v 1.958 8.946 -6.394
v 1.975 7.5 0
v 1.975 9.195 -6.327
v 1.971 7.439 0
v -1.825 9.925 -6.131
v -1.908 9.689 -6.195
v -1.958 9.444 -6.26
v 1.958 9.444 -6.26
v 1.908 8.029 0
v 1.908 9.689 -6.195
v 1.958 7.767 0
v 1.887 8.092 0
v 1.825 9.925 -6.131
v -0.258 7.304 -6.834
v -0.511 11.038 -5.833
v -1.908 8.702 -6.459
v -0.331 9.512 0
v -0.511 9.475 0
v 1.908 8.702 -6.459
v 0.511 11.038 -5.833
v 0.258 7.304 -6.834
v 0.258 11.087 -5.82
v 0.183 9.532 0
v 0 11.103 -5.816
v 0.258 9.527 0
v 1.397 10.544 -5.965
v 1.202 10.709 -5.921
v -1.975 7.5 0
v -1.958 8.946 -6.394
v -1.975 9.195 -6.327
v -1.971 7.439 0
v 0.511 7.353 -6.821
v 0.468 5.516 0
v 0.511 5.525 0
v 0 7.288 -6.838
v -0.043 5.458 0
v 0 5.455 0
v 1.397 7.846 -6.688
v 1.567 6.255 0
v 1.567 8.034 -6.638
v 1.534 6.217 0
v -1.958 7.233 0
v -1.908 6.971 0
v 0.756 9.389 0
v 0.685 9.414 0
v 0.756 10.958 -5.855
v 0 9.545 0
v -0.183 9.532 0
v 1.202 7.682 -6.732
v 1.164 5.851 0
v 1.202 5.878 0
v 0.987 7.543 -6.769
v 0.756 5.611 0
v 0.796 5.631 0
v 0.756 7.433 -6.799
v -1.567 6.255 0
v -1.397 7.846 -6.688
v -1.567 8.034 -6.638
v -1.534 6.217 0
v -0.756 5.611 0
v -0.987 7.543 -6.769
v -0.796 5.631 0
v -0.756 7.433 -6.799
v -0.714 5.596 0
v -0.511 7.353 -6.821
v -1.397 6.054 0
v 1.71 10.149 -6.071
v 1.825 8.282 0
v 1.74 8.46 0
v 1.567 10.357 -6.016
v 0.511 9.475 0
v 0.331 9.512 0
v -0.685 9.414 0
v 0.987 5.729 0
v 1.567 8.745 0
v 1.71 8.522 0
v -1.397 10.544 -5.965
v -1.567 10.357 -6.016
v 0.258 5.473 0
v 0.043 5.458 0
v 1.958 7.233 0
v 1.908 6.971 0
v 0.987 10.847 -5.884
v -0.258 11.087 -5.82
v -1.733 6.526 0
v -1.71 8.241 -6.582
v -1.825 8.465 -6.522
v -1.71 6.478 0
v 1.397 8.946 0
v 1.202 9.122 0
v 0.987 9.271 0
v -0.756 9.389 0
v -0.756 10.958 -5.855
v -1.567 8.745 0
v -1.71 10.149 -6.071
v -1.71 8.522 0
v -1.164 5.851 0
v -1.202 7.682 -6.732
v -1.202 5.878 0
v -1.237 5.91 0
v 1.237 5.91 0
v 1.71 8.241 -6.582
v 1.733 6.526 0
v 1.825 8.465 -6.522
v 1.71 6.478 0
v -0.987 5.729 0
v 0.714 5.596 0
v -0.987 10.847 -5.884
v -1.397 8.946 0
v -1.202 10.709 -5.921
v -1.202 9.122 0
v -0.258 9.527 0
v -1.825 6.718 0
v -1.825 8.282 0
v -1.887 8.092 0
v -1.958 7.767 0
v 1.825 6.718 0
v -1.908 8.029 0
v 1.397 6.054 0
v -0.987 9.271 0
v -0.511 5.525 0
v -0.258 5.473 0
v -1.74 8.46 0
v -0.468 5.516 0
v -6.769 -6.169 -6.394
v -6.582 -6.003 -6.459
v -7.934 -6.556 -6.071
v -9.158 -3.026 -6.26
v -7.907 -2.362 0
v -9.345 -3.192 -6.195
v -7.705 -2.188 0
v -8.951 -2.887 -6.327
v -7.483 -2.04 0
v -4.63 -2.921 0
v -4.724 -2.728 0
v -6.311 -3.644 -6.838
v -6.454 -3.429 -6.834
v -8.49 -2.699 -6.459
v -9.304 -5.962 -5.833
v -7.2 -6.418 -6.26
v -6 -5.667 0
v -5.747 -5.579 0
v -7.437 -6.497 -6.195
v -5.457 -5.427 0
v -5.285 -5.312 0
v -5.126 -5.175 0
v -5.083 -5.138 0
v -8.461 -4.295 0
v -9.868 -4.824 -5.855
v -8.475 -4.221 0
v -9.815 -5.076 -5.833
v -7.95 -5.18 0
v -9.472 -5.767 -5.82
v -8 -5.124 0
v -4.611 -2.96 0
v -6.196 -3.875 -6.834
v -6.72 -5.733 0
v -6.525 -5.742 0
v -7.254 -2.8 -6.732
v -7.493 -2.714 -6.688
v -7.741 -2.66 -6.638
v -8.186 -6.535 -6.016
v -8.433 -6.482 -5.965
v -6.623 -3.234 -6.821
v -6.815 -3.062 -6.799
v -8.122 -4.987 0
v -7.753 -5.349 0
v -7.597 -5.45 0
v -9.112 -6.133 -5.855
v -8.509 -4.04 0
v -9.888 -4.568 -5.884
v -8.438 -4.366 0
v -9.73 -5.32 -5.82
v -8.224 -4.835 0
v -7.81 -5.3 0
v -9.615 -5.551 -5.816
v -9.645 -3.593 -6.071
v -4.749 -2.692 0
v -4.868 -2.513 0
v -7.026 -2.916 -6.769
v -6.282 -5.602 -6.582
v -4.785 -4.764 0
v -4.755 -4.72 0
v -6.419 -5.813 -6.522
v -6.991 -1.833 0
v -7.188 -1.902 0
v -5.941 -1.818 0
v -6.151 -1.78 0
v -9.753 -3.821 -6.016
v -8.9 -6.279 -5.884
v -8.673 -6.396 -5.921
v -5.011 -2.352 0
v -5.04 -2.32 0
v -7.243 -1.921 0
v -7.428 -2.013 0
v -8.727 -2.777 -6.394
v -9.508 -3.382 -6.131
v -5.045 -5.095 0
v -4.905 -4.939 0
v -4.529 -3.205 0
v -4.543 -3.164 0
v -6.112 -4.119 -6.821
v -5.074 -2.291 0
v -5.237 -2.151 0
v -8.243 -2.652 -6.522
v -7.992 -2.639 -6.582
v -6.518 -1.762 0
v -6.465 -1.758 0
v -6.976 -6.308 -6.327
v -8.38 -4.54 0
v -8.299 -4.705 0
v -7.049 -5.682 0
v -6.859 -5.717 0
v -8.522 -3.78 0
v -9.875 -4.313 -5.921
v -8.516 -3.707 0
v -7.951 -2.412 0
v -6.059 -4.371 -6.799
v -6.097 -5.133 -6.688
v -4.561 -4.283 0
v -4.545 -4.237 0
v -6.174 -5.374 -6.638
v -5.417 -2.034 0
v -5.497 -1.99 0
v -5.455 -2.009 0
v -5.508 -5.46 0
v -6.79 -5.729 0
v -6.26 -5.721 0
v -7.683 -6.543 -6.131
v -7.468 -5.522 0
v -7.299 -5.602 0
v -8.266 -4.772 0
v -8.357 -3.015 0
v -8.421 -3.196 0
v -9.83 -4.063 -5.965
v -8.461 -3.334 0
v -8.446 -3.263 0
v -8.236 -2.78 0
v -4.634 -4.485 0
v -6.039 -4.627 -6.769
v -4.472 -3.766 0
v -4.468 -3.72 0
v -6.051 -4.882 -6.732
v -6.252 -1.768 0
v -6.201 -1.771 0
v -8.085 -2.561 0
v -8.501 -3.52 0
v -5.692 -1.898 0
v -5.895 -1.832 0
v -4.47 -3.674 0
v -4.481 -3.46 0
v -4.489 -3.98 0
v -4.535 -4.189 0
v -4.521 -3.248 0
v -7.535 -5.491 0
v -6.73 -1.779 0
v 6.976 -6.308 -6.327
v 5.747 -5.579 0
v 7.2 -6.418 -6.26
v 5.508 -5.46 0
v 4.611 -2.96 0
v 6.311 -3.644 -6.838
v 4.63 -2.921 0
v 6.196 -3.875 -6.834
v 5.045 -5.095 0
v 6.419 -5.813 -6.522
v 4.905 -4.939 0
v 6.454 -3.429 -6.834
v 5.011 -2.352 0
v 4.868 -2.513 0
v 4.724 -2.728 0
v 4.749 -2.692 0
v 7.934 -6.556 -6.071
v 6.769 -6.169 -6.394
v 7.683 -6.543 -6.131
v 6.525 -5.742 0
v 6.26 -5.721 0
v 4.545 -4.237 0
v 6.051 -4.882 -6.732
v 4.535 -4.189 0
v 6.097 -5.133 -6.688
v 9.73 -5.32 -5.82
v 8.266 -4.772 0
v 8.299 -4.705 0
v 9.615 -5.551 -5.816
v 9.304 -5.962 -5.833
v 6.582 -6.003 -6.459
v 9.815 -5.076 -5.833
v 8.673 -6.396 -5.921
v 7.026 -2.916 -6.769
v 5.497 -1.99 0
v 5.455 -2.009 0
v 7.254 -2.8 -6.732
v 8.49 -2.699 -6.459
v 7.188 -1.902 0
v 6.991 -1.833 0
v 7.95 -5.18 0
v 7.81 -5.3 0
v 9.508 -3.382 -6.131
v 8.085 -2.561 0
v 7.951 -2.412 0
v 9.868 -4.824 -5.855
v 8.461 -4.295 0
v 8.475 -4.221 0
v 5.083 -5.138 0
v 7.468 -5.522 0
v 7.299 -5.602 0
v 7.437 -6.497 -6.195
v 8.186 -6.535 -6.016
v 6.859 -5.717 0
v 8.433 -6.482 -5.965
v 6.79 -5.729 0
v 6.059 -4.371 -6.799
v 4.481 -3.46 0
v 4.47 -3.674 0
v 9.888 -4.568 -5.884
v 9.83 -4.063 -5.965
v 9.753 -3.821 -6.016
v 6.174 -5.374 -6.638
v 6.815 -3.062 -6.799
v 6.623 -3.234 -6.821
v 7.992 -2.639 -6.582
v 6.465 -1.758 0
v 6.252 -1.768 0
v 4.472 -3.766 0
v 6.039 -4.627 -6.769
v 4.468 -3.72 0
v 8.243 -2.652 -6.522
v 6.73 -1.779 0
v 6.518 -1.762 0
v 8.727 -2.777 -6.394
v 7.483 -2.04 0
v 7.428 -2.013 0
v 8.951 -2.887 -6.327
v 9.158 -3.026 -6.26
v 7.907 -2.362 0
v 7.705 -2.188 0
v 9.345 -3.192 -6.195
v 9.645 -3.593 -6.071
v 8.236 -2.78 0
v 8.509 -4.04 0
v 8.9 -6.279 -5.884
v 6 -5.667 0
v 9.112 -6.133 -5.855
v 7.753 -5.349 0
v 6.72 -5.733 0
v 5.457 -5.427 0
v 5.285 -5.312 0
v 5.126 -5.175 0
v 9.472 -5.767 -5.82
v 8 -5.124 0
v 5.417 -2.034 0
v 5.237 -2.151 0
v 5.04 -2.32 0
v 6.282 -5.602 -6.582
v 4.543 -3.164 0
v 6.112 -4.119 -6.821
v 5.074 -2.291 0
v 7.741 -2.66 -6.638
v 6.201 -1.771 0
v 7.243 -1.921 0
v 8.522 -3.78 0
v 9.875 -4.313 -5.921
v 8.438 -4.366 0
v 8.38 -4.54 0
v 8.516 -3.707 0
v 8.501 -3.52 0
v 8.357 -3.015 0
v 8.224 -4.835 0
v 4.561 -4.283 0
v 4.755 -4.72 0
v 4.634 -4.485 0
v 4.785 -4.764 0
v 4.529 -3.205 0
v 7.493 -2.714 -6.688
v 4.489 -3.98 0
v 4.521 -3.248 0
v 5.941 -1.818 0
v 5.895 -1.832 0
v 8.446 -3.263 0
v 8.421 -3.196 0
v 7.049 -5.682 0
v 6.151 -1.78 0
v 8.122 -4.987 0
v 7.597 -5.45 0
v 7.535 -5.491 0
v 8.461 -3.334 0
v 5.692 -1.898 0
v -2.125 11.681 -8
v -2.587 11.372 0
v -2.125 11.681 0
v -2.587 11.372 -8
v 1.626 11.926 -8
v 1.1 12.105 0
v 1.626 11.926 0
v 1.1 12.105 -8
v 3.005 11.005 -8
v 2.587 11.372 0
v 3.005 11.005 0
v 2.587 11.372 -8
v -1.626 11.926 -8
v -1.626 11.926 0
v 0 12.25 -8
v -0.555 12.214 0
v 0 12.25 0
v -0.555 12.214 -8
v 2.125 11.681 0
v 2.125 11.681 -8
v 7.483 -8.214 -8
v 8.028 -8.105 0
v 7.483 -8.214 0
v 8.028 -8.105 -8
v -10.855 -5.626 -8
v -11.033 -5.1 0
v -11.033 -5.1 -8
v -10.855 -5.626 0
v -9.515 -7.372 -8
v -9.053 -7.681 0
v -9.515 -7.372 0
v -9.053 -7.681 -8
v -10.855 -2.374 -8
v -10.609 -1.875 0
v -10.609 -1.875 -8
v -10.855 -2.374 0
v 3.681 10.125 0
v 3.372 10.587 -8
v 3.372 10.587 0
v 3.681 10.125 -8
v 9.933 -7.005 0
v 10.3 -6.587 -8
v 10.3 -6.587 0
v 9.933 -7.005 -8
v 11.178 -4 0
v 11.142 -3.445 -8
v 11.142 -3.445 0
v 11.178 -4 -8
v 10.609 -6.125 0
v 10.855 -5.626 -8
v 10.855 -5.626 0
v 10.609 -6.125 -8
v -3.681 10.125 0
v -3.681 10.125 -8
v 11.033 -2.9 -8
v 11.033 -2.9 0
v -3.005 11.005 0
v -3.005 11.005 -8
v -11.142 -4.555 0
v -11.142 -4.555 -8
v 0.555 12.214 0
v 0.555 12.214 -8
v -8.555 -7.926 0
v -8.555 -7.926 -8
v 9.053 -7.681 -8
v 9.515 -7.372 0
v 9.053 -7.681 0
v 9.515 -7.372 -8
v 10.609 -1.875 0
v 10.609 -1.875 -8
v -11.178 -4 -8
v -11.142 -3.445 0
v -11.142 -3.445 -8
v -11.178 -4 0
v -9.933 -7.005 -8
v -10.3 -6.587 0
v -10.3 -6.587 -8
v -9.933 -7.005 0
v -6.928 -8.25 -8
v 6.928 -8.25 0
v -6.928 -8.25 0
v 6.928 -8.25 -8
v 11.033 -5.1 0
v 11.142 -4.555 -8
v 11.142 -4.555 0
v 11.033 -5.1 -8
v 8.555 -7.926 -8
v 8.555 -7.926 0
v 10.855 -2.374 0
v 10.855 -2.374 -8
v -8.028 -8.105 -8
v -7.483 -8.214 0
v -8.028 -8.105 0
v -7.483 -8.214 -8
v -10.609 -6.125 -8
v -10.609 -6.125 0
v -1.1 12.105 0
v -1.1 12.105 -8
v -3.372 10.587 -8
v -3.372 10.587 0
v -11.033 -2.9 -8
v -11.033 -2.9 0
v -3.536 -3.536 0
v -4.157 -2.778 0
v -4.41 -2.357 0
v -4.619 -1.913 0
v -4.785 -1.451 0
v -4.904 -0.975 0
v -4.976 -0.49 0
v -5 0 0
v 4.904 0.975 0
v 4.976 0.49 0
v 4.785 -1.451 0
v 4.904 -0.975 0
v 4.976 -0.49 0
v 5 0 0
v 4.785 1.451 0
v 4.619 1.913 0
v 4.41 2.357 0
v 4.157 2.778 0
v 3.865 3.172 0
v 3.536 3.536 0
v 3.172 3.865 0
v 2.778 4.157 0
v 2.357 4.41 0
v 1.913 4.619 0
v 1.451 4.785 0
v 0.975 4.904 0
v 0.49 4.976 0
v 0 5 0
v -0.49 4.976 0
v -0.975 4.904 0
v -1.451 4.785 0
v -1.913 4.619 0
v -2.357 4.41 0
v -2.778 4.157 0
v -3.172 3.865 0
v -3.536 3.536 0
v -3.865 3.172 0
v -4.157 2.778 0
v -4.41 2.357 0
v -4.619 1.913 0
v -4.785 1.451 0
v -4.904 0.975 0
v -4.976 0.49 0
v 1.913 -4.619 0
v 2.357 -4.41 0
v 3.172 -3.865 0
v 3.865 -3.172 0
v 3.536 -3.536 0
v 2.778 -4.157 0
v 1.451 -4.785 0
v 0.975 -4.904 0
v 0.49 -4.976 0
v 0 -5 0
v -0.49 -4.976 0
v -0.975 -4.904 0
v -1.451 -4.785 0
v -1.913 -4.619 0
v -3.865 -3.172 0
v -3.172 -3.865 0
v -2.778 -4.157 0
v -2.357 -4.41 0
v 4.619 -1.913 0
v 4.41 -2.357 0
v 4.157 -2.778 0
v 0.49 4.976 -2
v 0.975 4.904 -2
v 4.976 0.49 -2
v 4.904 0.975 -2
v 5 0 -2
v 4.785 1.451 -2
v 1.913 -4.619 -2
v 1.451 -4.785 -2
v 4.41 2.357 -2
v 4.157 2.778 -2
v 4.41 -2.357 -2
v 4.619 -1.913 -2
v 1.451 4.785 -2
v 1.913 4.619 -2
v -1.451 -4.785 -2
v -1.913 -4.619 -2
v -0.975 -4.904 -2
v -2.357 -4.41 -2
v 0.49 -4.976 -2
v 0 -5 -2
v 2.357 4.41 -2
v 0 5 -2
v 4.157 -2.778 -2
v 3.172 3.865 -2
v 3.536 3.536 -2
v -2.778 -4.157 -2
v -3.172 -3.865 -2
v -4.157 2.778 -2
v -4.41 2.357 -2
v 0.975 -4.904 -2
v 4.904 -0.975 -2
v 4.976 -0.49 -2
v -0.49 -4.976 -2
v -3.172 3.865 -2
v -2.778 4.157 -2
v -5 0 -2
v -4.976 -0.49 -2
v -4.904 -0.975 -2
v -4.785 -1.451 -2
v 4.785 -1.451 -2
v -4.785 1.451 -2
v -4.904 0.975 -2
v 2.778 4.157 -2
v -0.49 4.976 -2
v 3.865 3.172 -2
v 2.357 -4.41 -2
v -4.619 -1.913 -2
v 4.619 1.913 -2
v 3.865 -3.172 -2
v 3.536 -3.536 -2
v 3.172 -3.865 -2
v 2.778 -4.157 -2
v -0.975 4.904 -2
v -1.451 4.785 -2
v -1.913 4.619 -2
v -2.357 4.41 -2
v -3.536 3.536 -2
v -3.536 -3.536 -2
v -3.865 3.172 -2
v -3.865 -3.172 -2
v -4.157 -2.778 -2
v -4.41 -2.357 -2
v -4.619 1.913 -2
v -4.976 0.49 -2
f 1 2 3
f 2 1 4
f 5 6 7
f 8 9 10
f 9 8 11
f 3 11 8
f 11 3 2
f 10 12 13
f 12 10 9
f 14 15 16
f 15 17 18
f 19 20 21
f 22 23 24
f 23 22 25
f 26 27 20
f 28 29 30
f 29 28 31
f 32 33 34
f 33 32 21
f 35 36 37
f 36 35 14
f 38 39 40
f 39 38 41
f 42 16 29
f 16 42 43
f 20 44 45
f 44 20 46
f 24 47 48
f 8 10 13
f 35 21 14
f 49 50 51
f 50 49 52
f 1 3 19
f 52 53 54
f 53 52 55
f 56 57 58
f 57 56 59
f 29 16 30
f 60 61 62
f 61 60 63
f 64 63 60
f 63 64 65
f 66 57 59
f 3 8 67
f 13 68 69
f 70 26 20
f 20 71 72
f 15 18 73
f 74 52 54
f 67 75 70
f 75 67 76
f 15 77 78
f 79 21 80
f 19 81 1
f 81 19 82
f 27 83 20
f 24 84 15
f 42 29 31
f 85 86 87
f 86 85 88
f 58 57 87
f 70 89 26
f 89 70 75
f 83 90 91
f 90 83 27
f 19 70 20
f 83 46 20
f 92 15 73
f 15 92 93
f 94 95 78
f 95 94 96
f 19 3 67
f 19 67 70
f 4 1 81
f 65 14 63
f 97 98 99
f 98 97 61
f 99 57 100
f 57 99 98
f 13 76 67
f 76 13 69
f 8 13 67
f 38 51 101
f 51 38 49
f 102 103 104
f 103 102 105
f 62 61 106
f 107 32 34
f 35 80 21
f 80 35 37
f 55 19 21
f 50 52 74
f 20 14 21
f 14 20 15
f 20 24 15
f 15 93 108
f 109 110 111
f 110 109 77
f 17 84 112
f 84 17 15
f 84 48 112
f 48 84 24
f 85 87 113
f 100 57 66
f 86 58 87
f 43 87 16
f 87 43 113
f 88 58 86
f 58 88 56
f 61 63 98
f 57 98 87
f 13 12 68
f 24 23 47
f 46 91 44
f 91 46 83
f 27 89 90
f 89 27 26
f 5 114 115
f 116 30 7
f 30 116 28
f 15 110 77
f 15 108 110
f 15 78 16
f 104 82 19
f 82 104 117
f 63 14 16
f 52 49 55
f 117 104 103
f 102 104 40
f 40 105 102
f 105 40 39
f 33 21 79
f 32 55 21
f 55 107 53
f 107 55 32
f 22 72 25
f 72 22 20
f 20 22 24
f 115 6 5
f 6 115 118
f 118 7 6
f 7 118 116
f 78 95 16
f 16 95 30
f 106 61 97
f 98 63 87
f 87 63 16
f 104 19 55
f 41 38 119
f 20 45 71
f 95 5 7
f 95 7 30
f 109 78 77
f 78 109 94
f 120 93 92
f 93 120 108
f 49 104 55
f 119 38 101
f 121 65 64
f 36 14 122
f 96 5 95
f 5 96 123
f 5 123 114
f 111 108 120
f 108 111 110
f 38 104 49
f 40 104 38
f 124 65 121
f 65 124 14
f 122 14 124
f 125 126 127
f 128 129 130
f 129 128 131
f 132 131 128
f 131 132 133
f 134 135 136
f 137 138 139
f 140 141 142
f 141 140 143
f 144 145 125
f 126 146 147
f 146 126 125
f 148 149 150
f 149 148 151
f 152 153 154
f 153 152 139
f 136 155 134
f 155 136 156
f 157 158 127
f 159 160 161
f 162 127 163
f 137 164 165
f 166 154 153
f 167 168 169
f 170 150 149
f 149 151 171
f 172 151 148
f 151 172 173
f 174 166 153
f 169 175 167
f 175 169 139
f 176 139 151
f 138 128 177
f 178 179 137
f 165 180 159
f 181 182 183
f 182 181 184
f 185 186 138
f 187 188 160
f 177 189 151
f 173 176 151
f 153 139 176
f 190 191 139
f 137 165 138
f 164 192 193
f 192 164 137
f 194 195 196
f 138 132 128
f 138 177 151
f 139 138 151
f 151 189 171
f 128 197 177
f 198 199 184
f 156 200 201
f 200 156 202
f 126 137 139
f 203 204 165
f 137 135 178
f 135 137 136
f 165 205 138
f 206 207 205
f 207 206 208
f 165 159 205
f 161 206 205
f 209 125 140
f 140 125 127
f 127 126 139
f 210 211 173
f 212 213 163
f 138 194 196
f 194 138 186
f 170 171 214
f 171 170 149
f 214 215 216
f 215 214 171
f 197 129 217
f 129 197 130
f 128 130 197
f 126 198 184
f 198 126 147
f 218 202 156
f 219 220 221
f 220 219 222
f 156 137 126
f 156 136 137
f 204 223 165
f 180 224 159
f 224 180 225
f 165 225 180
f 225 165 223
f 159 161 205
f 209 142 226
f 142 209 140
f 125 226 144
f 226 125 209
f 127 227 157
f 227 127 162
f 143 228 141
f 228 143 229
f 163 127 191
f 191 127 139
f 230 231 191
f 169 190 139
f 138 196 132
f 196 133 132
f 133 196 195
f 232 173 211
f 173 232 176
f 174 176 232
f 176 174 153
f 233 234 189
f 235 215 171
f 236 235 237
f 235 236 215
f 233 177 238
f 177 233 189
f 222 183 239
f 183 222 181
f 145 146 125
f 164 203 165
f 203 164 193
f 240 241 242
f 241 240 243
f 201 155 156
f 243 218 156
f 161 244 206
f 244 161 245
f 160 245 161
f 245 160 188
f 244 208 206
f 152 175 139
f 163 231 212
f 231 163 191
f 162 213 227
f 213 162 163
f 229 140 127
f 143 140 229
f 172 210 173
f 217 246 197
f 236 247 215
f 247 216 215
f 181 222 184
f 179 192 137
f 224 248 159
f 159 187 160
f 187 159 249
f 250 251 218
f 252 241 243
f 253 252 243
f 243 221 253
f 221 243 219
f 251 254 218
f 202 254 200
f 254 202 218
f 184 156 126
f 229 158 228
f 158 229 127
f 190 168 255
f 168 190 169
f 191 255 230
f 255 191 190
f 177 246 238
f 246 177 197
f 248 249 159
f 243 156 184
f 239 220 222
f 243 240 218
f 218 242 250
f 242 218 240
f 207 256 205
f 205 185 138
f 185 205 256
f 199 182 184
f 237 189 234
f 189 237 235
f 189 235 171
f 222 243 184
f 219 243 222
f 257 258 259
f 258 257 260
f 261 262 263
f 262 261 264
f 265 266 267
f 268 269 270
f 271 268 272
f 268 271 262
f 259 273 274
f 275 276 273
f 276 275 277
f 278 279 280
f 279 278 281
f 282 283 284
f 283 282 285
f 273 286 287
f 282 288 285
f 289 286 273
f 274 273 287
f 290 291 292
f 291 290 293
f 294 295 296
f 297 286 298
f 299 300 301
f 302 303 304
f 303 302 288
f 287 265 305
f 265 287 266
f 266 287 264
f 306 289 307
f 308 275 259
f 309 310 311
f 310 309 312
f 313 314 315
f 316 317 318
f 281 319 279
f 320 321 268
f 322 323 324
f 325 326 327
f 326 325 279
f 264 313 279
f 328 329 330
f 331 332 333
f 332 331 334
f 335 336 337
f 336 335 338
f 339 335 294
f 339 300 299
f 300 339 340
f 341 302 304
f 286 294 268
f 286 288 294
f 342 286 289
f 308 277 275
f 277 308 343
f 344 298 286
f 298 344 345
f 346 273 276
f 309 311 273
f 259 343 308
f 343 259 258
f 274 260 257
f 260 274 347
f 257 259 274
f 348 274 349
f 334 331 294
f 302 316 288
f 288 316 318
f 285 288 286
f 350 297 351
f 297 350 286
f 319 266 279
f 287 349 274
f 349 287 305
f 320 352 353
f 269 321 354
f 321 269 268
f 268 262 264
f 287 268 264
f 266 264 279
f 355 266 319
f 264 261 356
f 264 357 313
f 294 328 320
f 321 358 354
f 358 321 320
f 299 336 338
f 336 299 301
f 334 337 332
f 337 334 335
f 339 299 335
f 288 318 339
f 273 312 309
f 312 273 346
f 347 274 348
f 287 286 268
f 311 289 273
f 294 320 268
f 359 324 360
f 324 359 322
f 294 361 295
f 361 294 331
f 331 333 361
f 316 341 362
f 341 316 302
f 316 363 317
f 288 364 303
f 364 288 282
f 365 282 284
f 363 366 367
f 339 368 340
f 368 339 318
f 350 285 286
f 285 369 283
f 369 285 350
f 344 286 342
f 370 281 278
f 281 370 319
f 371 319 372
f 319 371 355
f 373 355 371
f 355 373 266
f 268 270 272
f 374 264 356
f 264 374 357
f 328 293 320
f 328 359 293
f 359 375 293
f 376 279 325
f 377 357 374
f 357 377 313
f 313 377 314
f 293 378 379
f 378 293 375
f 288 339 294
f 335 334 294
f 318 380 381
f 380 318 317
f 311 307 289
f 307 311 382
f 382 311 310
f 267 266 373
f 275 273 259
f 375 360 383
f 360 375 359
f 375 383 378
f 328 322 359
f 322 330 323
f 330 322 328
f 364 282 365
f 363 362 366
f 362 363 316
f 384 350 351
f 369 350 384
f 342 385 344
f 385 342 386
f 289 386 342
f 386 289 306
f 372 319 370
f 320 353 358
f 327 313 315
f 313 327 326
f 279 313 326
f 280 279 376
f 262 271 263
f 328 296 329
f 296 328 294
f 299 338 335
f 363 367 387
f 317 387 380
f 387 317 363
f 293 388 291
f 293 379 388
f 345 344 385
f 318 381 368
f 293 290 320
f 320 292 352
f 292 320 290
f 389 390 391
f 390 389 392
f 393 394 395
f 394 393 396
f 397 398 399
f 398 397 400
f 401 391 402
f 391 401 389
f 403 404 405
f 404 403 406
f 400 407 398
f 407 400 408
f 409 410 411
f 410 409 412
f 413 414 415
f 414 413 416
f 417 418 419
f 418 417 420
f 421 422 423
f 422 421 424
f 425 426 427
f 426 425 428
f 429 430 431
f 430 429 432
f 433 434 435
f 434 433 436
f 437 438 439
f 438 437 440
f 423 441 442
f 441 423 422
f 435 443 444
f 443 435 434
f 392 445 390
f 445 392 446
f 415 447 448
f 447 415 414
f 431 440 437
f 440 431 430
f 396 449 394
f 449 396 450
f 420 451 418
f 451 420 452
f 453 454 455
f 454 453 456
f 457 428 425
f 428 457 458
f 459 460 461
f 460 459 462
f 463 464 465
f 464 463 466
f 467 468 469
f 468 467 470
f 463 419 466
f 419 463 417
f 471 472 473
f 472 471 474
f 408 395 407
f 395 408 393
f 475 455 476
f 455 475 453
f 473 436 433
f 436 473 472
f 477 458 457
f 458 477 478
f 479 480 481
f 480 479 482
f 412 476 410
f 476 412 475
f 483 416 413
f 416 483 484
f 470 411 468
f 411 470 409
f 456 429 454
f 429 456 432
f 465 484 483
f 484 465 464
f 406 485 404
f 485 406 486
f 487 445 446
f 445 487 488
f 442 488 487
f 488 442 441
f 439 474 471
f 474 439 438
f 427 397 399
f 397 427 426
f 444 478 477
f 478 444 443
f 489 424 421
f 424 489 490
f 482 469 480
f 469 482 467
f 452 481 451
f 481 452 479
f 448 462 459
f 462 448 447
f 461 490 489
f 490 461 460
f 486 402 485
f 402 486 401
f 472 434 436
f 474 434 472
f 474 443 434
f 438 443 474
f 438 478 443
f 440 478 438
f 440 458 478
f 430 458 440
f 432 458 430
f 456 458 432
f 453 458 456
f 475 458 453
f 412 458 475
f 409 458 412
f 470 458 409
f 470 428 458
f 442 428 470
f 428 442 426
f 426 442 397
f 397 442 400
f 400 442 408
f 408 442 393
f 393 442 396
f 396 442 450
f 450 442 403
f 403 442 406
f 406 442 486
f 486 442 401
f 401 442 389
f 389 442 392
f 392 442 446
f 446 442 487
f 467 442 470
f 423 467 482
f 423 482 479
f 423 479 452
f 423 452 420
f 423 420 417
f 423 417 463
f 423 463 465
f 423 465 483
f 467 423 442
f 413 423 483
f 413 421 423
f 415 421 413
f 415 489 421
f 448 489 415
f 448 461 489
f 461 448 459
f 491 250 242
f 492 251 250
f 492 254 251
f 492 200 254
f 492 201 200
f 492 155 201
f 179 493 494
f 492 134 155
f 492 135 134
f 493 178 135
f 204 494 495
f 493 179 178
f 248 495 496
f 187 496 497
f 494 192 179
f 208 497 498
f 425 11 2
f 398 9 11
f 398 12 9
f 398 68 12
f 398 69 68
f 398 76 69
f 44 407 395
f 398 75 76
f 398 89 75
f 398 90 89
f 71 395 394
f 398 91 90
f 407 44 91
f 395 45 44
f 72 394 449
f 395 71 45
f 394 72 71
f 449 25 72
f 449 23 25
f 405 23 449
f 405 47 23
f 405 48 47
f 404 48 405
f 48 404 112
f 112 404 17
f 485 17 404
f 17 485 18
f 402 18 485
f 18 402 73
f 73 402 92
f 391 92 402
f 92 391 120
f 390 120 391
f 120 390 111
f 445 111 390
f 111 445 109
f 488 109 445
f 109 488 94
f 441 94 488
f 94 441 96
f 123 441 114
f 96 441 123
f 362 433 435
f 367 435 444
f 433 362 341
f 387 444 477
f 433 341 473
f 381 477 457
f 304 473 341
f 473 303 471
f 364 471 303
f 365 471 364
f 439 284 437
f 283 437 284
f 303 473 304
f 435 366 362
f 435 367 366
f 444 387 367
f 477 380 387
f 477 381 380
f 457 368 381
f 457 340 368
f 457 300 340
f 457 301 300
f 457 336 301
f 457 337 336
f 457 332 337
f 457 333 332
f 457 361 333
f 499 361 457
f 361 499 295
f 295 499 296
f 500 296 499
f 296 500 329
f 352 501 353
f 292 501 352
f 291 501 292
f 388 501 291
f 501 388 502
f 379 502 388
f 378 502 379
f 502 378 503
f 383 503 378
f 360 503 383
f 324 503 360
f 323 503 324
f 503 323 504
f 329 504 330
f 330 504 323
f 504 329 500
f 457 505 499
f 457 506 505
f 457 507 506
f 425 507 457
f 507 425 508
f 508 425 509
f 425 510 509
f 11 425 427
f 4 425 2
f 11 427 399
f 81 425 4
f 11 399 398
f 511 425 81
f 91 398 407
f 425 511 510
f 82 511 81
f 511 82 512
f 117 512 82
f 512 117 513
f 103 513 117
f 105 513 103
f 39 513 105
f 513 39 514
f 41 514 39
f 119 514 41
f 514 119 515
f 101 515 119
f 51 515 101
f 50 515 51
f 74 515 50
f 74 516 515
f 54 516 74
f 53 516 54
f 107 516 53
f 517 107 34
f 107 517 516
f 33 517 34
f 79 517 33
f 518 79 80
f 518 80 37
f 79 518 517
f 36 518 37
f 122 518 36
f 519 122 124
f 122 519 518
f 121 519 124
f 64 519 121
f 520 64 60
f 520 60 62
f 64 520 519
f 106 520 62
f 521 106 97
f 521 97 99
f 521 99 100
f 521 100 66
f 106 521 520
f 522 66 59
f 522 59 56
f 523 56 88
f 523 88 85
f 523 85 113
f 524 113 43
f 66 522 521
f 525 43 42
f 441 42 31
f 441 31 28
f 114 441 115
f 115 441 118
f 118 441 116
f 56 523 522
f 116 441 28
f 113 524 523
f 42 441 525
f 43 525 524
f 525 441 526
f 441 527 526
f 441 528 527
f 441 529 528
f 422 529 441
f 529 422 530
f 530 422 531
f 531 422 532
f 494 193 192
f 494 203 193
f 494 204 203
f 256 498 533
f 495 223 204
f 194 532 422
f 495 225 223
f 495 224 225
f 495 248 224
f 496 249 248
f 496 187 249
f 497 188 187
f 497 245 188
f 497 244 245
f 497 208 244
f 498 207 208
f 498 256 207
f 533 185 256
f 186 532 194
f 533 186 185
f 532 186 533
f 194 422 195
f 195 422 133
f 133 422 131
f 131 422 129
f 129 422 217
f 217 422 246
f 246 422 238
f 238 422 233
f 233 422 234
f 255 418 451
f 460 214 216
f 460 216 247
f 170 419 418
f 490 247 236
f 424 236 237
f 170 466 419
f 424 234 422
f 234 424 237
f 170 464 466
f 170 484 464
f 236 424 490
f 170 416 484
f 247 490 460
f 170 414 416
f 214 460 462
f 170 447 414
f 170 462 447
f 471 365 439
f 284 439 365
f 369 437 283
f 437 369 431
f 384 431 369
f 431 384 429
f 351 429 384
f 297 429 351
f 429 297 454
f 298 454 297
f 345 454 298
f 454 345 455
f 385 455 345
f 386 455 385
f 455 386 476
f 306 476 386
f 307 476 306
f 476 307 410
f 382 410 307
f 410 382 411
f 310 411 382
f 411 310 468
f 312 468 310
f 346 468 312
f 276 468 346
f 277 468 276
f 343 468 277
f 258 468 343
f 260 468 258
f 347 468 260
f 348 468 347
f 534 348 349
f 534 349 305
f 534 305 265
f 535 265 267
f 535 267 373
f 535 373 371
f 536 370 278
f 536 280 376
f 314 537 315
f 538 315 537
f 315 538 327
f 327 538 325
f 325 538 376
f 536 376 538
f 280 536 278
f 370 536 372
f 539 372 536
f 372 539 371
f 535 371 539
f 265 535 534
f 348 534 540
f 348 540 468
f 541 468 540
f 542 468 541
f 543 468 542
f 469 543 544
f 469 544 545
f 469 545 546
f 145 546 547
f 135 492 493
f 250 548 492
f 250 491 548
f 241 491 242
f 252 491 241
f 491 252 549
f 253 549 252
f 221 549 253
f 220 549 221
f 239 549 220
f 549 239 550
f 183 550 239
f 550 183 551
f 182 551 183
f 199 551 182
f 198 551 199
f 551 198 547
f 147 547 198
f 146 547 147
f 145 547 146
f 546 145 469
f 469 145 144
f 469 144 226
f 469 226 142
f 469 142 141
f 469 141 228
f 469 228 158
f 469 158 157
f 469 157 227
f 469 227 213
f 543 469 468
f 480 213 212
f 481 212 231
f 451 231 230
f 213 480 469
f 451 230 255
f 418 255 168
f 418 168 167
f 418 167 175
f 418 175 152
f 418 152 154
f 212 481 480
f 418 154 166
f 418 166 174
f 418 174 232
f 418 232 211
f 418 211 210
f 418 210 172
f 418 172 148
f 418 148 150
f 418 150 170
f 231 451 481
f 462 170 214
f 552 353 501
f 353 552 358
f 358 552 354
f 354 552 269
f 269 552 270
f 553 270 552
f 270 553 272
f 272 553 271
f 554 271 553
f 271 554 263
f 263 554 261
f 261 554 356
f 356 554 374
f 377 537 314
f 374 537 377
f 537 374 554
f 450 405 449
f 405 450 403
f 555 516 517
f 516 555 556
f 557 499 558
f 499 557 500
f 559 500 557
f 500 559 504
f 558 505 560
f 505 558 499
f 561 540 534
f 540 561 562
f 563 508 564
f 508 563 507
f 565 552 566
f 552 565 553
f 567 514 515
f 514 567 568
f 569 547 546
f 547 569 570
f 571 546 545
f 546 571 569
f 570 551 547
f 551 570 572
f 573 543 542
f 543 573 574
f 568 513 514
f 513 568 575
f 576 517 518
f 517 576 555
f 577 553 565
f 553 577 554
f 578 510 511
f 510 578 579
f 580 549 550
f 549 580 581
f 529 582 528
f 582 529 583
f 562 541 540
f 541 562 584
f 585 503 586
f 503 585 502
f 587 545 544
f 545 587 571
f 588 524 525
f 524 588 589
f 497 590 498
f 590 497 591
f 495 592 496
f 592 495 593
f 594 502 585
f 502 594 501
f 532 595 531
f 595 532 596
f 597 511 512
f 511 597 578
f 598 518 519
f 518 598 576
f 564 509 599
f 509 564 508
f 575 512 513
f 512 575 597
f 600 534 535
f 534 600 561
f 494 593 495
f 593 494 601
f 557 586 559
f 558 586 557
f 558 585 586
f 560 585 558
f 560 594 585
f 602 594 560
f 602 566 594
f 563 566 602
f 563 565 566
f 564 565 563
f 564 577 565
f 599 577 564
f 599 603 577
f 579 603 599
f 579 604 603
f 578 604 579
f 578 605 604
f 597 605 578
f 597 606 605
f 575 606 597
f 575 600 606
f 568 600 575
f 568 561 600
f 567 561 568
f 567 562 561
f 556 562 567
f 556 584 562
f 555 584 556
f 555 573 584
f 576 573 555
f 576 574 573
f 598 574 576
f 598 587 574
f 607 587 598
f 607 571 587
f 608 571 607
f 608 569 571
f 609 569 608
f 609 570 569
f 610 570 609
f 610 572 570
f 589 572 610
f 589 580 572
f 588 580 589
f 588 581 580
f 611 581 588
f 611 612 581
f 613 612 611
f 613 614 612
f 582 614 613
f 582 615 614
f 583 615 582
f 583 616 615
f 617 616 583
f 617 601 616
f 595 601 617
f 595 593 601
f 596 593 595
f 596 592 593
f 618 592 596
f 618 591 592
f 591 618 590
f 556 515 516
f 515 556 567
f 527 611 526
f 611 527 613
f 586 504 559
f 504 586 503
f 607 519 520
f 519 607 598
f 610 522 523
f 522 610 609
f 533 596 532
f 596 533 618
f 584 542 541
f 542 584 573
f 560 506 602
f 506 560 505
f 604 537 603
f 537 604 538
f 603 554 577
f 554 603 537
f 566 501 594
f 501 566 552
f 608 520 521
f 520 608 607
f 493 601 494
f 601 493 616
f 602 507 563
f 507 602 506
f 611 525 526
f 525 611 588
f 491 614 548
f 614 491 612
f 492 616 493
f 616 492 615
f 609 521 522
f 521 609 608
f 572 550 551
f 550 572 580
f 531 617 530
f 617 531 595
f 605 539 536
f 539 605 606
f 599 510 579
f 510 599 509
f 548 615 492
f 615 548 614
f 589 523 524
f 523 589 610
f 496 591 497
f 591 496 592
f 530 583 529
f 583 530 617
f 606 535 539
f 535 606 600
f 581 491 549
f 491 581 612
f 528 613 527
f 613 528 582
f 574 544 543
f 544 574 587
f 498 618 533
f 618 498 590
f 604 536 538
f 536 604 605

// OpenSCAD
magnet_h = 2.7;
magnet_dia = 10;

angle = 15;


difference(){
	union(){
		hull(){
			for(a = [0,120,240]){
				rotate([0,0,a]) translate([0,8,-8]) cylinder(d = 8.5, h = 8, $fn = 48);
			}
		}
		//translate([0,0,-8]) cylinder(d = 24, h = 8);
	}
	translate([0,0,-magnet_h+0.7]) cylinder(d = magnet_dia, h = magnet_h+.01, $fn=64);
	for(a = [0,120,240]){
		rotate([0,0,a]) translate([0,7.5,0]) rotate([angle, 0, 0]) 
			translate([0,0,-6.55]) cylinder(d = 3.95, h = 8.5, $fn = 48);

	}
}


//Visualization stuff
/*translate([0,0,-magnet_h+0.6]) magnet();

for(a = [0,120,240]){
		rotate([0,0,a]) translate([0,7.5,0]) rotate([angle, 0, 0]) screw();
}*/

//Modules
module magnet(){
	color("silver") translate() difference(){
		cylinder(d = magnet_dia-0.05, h = magnet_h, $fn=64);
		cylinder(d = 3, h = 7, $fn=24, center = true);
		translate([0,0,magnet_h-1.79]) cylinder(d1 = 3, d2 = 6.55, h = 1.81, $fn=24);
	}
}

module screw(){
	color("DimGray"){
		cylinder(d2 = 5.9, d1=2.8, h = 1.77, $fn = 48);
		translate([0,0,-4]) cylinder(d=2.8, h = 4.0, $fn = 48);
	}
}
